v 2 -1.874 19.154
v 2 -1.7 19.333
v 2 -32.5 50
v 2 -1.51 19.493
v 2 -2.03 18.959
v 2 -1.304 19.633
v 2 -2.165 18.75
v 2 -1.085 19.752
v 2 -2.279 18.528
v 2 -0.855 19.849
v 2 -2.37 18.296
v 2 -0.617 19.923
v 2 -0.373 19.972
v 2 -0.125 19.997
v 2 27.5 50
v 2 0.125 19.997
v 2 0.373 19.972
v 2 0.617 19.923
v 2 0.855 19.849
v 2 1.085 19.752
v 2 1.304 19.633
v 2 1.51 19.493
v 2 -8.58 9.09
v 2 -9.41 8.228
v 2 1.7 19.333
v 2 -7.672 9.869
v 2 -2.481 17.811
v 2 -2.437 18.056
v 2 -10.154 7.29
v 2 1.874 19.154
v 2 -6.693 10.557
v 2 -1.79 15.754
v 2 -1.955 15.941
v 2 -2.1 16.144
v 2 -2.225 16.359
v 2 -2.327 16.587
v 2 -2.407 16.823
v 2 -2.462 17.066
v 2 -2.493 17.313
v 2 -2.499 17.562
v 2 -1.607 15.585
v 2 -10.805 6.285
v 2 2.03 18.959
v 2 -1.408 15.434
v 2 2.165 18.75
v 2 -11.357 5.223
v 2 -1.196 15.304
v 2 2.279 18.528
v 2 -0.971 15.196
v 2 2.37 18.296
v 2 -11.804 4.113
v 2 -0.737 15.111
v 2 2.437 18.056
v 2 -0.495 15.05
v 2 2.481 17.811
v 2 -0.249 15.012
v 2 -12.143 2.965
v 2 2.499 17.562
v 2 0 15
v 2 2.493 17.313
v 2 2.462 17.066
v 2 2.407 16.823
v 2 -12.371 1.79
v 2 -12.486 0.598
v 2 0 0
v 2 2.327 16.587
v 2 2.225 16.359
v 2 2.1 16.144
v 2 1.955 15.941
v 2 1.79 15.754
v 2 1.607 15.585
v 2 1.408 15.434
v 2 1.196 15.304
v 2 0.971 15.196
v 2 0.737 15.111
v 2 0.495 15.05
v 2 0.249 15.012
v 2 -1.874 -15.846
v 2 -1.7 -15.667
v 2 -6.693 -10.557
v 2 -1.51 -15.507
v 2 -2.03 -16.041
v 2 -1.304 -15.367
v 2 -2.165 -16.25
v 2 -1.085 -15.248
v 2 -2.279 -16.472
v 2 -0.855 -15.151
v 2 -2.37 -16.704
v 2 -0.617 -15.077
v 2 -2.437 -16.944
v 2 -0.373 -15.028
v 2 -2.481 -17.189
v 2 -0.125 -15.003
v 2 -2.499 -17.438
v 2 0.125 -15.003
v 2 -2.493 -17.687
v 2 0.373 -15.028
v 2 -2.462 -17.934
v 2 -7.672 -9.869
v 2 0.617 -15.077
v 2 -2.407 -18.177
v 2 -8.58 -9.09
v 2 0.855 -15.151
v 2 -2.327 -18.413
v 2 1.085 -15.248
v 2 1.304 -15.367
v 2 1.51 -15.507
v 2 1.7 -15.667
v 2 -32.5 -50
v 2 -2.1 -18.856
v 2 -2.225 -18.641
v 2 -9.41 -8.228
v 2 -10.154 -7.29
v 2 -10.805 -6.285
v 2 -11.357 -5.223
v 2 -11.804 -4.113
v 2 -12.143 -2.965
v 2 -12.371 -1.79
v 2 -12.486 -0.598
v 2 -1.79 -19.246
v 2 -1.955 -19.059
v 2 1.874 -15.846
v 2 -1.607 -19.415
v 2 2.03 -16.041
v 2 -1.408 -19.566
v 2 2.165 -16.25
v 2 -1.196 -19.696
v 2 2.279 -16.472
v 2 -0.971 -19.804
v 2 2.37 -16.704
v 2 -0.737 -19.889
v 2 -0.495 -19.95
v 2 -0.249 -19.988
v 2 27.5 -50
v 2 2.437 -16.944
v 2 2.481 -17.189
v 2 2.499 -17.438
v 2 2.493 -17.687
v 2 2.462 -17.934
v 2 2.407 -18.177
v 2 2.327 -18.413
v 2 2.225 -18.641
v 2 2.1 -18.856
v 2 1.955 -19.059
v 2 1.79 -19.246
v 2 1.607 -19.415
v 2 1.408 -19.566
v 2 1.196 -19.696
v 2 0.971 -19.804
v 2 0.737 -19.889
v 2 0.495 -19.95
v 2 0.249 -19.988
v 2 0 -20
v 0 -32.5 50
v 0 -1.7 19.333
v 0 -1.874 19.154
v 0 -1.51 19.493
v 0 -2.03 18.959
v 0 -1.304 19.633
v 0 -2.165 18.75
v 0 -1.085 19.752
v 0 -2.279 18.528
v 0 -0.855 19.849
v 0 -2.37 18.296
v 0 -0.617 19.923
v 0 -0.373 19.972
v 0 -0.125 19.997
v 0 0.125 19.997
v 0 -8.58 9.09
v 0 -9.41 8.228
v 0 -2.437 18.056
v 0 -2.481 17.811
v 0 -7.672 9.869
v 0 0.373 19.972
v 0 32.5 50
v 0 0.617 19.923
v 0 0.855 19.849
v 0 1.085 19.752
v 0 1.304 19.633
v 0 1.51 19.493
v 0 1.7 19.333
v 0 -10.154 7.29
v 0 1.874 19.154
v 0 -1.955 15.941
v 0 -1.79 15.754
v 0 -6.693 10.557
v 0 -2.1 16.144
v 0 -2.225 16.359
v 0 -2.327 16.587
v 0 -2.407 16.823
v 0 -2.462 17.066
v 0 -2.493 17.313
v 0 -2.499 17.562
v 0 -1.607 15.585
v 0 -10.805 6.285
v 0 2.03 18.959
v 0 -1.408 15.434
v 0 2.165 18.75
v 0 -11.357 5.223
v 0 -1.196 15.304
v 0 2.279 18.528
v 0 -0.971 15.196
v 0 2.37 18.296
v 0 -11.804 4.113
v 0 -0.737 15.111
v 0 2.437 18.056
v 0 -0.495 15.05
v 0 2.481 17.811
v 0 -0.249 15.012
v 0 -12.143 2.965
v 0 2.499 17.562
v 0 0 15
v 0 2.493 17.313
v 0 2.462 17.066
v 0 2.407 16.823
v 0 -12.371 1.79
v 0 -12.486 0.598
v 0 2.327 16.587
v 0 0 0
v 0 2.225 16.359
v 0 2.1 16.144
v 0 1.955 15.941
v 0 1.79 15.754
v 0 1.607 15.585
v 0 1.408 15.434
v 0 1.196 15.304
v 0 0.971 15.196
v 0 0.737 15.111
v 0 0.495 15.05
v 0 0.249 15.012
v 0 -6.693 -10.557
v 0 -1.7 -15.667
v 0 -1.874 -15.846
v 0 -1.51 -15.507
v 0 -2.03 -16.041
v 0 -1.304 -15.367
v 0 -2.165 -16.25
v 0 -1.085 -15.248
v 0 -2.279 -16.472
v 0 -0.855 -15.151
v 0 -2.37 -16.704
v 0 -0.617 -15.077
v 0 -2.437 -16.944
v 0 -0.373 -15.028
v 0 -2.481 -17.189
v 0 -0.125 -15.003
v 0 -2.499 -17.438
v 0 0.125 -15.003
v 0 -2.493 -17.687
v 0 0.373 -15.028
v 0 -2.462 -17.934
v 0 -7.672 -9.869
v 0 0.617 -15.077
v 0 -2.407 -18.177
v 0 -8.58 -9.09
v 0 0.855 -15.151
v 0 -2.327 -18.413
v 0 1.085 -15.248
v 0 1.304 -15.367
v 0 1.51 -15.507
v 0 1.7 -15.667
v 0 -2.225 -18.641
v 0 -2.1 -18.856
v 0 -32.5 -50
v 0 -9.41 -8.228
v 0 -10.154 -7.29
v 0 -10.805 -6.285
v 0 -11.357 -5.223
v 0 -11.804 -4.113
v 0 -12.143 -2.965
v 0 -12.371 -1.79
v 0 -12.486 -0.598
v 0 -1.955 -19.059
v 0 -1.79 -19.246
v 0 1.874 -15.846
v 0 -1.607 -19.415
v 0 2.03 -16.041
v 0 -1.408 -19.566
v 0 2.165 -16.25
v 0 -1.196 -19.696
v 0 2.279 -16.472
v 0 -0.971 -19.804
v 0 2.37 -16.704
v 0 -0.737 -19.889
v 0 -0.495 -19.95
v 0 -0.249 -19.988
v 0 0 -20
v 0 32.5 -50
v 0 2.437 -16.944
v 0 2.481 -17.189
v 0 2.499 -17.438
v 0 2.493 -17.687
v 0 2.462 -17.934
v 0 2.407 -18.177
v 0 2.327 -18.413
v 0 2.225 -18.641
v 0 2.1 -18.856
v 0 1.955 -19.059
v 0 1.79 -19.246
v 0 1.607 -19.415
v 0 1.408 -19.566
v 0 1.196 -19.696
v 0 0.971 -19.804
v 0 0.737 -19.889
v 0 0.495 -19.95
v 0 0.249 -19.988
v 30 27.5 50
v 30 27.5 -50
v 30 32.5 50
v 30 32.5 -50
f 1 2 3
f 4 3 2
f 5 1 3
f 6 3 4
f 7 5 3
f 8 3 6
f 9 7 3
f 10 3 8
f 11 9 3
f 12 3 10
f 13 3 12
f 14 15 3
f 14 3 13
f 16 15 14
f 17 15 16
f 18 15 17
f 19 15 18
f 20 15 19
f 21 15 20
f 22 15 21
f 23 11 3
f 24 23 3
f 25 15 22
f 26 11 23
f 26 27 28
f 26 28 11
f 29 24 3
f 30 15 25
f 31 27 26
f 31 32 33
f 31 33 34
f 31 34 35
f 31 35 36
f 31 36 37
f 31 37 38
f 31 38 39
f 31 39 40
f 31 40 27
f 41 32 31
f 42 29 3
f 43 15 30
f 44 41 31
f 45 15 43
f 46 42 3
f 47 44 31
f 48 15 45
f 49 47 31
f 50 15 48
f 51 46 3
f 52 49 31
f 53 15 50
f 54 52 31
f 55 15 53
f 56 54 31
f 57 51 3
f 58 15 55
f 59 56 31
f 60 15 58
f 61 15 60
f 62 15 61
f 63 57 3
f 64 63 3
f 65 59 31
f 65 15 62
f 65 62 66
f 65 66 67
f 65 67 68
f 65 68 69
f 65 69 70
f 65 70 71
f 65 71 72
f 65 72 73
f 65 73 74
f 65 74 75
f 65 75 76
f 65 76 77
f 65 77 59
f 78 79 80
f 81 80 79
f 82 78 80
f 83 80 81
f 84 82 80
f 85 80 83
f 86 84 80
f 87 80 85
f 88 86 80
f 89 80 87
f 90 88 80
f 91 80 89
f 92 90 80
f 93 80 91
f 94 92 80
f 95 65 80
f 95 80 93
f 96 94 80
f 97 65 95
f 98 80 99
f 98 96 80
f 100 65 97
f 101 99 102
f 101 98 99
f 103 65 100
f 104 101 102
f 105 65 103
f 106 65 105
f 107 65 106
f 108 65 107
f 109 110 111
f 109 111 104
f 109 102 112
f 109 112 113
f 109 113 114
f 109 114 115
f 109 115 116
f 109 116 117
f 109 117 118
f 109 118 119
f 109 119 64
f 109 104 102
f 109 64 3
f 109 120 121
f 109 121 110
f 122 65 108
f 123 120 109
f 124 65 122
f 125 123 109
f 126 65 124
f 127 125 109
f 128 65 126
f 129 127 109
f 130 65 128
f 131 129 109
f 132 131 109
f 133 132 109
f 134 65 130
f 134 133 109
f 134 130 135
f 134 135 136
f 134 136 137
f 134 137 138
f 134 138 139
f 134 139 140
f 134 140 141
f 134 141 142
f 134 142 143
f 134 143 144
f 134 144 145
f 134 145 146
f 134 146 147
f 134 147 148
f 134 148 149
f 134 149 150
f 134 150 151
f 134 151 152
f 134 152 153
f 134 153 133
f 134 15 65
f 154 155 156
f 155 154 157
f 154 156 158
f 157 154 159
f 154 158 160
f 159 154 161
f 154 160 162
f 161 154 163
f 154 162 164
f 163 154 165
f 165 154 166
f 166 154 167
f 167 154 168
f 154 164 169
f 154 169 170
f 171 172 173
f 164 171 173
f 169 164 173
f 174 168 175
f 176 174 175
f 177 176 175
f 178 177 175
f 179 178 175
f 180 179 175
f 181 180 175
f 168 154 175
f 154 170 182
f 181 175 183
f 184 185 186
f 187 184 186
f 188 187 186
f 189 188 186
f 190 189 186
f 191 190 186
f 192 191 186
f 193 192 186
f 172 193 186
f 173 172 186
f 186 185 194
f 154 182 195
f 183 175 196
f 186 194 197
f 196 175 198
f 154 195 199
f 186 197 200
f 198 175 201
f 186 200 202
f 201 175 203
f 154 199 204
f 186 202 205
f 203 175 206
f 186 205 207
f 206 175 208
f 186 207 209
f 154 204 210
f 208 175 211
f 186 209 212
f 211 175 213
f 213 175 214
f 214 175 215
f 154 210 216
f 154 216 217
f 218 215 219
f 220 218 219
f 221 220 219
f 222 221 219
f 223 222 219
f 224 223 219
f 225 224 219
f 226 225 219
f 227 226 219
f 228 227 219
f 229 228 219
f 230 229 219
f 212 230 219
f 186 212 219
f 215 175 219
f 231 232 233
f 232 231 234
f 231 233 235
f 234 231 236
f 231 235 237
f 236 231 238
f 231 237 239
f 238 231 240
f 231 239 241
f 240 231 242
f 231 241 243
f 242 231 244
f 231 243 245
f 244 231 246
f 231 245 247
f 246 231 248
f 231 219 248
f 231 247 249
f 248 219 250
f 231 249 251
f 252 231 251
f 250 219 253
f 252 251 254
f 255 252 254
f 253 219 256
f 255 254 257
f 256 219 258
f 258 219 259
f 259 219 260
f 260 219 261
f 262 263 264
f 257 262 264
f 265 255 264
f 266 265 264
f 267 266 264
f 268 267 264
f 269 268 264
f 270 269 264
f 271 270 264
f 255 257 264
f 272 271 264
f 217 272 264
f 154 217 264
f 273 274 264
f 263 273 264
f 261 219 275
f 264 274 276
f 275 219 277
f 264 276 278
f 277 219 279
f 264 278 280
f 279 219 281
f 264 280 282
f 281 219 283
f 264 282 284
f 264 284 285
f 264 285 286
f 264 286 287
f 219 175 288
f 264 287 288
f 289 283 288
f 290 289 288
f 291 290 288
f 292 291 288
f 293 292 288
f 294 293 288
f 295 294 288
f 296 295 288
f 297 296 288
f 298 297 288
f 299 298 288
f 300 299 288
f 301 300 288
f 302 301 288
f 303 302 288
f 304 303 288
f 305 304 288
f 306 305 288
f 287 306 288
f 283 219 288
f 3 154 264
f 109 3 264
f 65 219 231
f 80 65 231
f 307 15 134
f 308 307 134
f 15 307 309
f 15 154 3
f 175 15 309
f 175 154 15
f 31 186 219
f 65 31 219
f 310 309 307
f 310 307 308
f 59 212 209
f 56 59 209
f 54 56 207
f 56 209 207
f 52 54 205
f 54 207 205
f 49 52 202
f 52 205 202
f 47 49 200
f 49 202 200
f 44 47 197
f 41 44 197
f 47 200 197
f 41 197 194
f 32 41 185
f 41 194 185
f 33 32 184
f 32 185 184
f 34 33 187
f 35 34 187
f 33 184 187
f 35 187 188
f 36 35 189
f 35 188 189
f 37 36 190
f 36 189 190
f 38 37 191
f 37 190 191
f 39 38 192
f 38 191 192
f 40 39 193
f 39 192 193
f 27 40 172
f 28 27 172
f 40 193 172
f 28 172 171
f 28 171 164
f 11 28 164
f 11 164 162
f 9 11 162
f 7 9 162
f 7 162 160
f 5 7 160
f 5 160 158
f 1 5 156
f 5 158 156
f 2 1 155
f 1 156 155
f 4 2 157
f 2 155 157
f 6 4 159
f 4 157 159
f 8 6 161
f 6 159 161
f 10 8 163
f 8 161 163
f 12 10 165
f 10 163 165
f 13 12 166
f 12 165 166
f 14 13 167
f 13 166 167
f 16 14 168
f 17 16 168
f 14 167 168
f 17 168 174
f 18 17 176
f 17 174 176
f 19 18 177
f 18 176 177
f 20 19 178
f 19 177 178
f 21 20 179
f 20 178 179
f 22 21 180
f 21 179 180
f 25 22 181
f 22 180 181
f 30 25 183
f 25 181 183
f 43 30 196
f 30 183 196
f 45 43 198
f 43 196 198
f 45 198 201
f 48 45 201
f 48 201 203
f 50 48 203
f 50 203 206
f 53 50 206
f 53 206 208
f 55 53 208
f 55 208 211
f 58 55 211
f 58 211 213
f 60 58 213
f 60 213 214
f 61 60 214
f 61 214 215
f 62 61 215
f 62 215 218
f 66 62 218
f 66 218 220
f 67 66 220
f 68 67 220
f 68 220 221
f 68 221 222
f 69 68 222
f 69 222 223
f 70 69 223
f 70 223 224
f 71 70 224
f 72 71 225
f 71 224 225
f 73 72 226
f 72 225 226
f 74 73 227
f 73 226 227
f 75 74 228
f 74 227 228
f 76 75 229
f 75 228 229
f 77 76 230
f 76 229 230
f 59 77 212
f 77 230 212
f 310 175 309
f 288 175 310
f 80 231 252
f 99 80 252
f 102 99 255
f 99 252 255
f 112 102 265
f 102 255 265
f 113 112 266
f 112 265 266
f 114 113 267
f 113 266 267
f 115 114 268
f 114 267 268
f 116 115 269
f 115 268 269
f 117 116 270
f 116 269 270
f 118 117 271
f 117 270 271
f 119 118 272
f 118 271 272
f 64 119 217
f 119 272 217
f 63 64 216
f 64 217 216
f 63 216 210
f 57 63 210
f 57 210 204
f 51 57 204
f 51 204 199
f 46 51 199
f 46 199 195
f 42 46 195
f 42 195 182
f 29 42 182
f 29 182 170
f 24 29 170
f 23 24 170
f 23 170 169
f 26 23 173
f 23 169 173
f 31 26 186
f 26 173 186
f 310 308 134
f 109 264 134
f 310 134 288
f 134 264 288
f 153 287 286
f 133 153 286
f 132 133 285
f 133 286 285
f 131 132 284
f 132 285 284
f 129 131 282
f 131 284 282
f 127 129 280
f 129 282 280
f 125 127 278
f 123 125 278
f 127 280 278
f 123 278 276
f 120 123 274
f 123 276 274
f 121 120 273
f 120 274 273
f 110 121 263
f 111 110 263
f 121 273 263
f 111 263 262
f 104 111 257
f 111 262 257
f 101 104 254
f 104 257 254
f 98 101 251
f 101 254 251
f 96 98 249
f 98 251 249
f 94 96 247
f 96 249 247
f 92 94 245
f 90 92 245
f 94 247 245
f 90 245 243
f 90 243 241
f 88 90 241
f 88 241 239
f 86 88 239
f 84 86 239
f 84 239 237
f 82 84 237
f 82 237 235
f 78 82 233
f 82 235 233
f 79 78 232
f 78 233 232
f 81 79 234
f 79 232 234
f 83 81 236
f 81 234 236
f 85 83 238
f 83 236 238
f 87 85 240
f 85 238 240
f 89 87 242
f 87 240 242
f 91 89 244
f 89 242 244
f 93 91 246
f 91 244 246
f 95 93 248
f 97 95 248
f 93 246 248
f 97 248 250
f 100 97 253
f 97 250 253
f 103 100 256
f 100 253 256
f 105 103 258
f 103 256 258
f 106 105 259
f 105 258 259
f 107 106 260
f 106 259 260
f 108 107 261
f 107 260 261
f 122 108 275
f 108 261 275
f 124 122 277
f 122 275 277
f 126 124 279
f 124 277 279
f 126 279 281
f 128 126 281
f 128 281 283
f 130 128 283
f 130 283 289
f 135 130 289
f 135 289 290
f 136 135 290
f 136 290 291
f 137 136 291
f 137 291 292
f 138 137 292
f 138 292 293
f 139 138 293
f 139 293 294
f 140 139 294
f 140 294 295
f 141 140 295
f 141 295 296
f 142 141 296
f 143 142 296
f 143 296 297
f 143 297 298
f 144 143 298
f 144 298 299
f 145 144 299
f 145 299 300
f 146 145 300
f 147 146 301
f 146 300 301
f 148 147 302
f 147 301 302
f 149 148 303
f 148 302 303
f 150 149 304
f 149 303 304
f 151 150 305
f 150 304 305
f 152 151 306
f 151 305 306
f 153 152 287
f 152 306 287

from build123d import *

# Parameters (mm, degrees)
SKETCH1_W           = 100
SKETCH1_H           = 5
BOSS_EXTRUDE5_DEPTH = 2
SKETCH4_W           = 100
SKETCH4_H           = 5
BOSS_EXTRUDE6_DEPTH = 28


with BuildPart() as part:
    # Sketch1 → Boss-Extrude5 (new body)
    with BuildSketch(Plane(origin=(0, 0, 0), x_dir=(0, 0, -1), z_dir=(1, 0, 0))):
        with Locations((0, 30)):
            Rectangle(SKETCH1_W, SKETCH1_H)
        with BuildLine():
            ThreePointArc((-12.5, 0), (0, 12.5), (12.5, 0))
            Line((12.5, 0), (15, 0))
            ThreePointArc((15, 0), (17.5, 2.5), (20, 0))
            Line((20, 0), (50, 0))
            Line((50, 0), (50, 27.5))
            Line((50, 27.5), (-50, 27.5))
            Line((-50, 27.5), (-50, 0))
            Line((-50, 0), (-20, 0))
            ThreePointArc((-20, 0), (-17.5, 2.5), (-15, 0))
            Line((-15, 0), (-12.5, 0))
        make_face()
        with BuildLine():
            Line((-12.5, 0), (0, 0))
            Line((0, 0), (12.5, 0))
            ThreePointArc((12.5, 0), (0, 12.5), (-12.5, 0))
        make_face()
        with BuildLine():
            Line((-10.55739691, -6.692635541), (0, 0))
            Line((0, 0), (-12.5, 0))
            ThreePointArc((-12.5, 0), (-12.00452959, -3.484432423), (-10.55739691, -6.692635541))
        make_face()
        with BuildLine():
            Line((12.5, 0), (0, 0))
            Line((0, 0), (10.55739691, -6.692635541))
            ThreePointArc((10.55739691, -6.692635541), (12.00452959, -3.484432423), (12.5, 0))
        make_face()
        with BuildLine():
            ThreePointArc((10.55739691, -6.692635541), (0, -12.5), (-10.55739691, -6.692635541))
            ThreePointArc((-10.55739691, -6.692635541), (-12.00452959, -3.484432423), (-12.5, 0))
            Line((-12.5, 0), (-15, 0))
            ThreePointArc((-15, 0), (-17.5, -2.5), (-20, 0))
            Line((-20, 0), (-50, 0))
            Line((-50, 0), (-50, -32.5))
            Line((-50, -32.5), (50, -32.5))
            Line((50, -32.5), (50, 0))
            Line((50, 0), (20, 0))
            ThreePointArc((20, 0), (17.5, -2.5), (15, 0))
            Line((15, 0), (12.5, 0))
            ThreePointArc((12.5, 0), (12.00452959, -3.484432423), (10.55739691, -6.692635541))
        make_face()
    extrude(amount=BOSS_EXTRUDE5_DEPTH)

    # Sketch4 → Boss-Extrude6 (add)
    with BuildSketch(Plane(origin=(2, 0, 0), x_dir=(0, 0, -1), z_dir=(1, 0, 0))):
        with Locations((0, 30)):
            Rectangle(SKETCH4_W, SKETCH4_H)
    extrude(amount=BOSS_EXTRUDE6_DEPTH)


solid = part.part
